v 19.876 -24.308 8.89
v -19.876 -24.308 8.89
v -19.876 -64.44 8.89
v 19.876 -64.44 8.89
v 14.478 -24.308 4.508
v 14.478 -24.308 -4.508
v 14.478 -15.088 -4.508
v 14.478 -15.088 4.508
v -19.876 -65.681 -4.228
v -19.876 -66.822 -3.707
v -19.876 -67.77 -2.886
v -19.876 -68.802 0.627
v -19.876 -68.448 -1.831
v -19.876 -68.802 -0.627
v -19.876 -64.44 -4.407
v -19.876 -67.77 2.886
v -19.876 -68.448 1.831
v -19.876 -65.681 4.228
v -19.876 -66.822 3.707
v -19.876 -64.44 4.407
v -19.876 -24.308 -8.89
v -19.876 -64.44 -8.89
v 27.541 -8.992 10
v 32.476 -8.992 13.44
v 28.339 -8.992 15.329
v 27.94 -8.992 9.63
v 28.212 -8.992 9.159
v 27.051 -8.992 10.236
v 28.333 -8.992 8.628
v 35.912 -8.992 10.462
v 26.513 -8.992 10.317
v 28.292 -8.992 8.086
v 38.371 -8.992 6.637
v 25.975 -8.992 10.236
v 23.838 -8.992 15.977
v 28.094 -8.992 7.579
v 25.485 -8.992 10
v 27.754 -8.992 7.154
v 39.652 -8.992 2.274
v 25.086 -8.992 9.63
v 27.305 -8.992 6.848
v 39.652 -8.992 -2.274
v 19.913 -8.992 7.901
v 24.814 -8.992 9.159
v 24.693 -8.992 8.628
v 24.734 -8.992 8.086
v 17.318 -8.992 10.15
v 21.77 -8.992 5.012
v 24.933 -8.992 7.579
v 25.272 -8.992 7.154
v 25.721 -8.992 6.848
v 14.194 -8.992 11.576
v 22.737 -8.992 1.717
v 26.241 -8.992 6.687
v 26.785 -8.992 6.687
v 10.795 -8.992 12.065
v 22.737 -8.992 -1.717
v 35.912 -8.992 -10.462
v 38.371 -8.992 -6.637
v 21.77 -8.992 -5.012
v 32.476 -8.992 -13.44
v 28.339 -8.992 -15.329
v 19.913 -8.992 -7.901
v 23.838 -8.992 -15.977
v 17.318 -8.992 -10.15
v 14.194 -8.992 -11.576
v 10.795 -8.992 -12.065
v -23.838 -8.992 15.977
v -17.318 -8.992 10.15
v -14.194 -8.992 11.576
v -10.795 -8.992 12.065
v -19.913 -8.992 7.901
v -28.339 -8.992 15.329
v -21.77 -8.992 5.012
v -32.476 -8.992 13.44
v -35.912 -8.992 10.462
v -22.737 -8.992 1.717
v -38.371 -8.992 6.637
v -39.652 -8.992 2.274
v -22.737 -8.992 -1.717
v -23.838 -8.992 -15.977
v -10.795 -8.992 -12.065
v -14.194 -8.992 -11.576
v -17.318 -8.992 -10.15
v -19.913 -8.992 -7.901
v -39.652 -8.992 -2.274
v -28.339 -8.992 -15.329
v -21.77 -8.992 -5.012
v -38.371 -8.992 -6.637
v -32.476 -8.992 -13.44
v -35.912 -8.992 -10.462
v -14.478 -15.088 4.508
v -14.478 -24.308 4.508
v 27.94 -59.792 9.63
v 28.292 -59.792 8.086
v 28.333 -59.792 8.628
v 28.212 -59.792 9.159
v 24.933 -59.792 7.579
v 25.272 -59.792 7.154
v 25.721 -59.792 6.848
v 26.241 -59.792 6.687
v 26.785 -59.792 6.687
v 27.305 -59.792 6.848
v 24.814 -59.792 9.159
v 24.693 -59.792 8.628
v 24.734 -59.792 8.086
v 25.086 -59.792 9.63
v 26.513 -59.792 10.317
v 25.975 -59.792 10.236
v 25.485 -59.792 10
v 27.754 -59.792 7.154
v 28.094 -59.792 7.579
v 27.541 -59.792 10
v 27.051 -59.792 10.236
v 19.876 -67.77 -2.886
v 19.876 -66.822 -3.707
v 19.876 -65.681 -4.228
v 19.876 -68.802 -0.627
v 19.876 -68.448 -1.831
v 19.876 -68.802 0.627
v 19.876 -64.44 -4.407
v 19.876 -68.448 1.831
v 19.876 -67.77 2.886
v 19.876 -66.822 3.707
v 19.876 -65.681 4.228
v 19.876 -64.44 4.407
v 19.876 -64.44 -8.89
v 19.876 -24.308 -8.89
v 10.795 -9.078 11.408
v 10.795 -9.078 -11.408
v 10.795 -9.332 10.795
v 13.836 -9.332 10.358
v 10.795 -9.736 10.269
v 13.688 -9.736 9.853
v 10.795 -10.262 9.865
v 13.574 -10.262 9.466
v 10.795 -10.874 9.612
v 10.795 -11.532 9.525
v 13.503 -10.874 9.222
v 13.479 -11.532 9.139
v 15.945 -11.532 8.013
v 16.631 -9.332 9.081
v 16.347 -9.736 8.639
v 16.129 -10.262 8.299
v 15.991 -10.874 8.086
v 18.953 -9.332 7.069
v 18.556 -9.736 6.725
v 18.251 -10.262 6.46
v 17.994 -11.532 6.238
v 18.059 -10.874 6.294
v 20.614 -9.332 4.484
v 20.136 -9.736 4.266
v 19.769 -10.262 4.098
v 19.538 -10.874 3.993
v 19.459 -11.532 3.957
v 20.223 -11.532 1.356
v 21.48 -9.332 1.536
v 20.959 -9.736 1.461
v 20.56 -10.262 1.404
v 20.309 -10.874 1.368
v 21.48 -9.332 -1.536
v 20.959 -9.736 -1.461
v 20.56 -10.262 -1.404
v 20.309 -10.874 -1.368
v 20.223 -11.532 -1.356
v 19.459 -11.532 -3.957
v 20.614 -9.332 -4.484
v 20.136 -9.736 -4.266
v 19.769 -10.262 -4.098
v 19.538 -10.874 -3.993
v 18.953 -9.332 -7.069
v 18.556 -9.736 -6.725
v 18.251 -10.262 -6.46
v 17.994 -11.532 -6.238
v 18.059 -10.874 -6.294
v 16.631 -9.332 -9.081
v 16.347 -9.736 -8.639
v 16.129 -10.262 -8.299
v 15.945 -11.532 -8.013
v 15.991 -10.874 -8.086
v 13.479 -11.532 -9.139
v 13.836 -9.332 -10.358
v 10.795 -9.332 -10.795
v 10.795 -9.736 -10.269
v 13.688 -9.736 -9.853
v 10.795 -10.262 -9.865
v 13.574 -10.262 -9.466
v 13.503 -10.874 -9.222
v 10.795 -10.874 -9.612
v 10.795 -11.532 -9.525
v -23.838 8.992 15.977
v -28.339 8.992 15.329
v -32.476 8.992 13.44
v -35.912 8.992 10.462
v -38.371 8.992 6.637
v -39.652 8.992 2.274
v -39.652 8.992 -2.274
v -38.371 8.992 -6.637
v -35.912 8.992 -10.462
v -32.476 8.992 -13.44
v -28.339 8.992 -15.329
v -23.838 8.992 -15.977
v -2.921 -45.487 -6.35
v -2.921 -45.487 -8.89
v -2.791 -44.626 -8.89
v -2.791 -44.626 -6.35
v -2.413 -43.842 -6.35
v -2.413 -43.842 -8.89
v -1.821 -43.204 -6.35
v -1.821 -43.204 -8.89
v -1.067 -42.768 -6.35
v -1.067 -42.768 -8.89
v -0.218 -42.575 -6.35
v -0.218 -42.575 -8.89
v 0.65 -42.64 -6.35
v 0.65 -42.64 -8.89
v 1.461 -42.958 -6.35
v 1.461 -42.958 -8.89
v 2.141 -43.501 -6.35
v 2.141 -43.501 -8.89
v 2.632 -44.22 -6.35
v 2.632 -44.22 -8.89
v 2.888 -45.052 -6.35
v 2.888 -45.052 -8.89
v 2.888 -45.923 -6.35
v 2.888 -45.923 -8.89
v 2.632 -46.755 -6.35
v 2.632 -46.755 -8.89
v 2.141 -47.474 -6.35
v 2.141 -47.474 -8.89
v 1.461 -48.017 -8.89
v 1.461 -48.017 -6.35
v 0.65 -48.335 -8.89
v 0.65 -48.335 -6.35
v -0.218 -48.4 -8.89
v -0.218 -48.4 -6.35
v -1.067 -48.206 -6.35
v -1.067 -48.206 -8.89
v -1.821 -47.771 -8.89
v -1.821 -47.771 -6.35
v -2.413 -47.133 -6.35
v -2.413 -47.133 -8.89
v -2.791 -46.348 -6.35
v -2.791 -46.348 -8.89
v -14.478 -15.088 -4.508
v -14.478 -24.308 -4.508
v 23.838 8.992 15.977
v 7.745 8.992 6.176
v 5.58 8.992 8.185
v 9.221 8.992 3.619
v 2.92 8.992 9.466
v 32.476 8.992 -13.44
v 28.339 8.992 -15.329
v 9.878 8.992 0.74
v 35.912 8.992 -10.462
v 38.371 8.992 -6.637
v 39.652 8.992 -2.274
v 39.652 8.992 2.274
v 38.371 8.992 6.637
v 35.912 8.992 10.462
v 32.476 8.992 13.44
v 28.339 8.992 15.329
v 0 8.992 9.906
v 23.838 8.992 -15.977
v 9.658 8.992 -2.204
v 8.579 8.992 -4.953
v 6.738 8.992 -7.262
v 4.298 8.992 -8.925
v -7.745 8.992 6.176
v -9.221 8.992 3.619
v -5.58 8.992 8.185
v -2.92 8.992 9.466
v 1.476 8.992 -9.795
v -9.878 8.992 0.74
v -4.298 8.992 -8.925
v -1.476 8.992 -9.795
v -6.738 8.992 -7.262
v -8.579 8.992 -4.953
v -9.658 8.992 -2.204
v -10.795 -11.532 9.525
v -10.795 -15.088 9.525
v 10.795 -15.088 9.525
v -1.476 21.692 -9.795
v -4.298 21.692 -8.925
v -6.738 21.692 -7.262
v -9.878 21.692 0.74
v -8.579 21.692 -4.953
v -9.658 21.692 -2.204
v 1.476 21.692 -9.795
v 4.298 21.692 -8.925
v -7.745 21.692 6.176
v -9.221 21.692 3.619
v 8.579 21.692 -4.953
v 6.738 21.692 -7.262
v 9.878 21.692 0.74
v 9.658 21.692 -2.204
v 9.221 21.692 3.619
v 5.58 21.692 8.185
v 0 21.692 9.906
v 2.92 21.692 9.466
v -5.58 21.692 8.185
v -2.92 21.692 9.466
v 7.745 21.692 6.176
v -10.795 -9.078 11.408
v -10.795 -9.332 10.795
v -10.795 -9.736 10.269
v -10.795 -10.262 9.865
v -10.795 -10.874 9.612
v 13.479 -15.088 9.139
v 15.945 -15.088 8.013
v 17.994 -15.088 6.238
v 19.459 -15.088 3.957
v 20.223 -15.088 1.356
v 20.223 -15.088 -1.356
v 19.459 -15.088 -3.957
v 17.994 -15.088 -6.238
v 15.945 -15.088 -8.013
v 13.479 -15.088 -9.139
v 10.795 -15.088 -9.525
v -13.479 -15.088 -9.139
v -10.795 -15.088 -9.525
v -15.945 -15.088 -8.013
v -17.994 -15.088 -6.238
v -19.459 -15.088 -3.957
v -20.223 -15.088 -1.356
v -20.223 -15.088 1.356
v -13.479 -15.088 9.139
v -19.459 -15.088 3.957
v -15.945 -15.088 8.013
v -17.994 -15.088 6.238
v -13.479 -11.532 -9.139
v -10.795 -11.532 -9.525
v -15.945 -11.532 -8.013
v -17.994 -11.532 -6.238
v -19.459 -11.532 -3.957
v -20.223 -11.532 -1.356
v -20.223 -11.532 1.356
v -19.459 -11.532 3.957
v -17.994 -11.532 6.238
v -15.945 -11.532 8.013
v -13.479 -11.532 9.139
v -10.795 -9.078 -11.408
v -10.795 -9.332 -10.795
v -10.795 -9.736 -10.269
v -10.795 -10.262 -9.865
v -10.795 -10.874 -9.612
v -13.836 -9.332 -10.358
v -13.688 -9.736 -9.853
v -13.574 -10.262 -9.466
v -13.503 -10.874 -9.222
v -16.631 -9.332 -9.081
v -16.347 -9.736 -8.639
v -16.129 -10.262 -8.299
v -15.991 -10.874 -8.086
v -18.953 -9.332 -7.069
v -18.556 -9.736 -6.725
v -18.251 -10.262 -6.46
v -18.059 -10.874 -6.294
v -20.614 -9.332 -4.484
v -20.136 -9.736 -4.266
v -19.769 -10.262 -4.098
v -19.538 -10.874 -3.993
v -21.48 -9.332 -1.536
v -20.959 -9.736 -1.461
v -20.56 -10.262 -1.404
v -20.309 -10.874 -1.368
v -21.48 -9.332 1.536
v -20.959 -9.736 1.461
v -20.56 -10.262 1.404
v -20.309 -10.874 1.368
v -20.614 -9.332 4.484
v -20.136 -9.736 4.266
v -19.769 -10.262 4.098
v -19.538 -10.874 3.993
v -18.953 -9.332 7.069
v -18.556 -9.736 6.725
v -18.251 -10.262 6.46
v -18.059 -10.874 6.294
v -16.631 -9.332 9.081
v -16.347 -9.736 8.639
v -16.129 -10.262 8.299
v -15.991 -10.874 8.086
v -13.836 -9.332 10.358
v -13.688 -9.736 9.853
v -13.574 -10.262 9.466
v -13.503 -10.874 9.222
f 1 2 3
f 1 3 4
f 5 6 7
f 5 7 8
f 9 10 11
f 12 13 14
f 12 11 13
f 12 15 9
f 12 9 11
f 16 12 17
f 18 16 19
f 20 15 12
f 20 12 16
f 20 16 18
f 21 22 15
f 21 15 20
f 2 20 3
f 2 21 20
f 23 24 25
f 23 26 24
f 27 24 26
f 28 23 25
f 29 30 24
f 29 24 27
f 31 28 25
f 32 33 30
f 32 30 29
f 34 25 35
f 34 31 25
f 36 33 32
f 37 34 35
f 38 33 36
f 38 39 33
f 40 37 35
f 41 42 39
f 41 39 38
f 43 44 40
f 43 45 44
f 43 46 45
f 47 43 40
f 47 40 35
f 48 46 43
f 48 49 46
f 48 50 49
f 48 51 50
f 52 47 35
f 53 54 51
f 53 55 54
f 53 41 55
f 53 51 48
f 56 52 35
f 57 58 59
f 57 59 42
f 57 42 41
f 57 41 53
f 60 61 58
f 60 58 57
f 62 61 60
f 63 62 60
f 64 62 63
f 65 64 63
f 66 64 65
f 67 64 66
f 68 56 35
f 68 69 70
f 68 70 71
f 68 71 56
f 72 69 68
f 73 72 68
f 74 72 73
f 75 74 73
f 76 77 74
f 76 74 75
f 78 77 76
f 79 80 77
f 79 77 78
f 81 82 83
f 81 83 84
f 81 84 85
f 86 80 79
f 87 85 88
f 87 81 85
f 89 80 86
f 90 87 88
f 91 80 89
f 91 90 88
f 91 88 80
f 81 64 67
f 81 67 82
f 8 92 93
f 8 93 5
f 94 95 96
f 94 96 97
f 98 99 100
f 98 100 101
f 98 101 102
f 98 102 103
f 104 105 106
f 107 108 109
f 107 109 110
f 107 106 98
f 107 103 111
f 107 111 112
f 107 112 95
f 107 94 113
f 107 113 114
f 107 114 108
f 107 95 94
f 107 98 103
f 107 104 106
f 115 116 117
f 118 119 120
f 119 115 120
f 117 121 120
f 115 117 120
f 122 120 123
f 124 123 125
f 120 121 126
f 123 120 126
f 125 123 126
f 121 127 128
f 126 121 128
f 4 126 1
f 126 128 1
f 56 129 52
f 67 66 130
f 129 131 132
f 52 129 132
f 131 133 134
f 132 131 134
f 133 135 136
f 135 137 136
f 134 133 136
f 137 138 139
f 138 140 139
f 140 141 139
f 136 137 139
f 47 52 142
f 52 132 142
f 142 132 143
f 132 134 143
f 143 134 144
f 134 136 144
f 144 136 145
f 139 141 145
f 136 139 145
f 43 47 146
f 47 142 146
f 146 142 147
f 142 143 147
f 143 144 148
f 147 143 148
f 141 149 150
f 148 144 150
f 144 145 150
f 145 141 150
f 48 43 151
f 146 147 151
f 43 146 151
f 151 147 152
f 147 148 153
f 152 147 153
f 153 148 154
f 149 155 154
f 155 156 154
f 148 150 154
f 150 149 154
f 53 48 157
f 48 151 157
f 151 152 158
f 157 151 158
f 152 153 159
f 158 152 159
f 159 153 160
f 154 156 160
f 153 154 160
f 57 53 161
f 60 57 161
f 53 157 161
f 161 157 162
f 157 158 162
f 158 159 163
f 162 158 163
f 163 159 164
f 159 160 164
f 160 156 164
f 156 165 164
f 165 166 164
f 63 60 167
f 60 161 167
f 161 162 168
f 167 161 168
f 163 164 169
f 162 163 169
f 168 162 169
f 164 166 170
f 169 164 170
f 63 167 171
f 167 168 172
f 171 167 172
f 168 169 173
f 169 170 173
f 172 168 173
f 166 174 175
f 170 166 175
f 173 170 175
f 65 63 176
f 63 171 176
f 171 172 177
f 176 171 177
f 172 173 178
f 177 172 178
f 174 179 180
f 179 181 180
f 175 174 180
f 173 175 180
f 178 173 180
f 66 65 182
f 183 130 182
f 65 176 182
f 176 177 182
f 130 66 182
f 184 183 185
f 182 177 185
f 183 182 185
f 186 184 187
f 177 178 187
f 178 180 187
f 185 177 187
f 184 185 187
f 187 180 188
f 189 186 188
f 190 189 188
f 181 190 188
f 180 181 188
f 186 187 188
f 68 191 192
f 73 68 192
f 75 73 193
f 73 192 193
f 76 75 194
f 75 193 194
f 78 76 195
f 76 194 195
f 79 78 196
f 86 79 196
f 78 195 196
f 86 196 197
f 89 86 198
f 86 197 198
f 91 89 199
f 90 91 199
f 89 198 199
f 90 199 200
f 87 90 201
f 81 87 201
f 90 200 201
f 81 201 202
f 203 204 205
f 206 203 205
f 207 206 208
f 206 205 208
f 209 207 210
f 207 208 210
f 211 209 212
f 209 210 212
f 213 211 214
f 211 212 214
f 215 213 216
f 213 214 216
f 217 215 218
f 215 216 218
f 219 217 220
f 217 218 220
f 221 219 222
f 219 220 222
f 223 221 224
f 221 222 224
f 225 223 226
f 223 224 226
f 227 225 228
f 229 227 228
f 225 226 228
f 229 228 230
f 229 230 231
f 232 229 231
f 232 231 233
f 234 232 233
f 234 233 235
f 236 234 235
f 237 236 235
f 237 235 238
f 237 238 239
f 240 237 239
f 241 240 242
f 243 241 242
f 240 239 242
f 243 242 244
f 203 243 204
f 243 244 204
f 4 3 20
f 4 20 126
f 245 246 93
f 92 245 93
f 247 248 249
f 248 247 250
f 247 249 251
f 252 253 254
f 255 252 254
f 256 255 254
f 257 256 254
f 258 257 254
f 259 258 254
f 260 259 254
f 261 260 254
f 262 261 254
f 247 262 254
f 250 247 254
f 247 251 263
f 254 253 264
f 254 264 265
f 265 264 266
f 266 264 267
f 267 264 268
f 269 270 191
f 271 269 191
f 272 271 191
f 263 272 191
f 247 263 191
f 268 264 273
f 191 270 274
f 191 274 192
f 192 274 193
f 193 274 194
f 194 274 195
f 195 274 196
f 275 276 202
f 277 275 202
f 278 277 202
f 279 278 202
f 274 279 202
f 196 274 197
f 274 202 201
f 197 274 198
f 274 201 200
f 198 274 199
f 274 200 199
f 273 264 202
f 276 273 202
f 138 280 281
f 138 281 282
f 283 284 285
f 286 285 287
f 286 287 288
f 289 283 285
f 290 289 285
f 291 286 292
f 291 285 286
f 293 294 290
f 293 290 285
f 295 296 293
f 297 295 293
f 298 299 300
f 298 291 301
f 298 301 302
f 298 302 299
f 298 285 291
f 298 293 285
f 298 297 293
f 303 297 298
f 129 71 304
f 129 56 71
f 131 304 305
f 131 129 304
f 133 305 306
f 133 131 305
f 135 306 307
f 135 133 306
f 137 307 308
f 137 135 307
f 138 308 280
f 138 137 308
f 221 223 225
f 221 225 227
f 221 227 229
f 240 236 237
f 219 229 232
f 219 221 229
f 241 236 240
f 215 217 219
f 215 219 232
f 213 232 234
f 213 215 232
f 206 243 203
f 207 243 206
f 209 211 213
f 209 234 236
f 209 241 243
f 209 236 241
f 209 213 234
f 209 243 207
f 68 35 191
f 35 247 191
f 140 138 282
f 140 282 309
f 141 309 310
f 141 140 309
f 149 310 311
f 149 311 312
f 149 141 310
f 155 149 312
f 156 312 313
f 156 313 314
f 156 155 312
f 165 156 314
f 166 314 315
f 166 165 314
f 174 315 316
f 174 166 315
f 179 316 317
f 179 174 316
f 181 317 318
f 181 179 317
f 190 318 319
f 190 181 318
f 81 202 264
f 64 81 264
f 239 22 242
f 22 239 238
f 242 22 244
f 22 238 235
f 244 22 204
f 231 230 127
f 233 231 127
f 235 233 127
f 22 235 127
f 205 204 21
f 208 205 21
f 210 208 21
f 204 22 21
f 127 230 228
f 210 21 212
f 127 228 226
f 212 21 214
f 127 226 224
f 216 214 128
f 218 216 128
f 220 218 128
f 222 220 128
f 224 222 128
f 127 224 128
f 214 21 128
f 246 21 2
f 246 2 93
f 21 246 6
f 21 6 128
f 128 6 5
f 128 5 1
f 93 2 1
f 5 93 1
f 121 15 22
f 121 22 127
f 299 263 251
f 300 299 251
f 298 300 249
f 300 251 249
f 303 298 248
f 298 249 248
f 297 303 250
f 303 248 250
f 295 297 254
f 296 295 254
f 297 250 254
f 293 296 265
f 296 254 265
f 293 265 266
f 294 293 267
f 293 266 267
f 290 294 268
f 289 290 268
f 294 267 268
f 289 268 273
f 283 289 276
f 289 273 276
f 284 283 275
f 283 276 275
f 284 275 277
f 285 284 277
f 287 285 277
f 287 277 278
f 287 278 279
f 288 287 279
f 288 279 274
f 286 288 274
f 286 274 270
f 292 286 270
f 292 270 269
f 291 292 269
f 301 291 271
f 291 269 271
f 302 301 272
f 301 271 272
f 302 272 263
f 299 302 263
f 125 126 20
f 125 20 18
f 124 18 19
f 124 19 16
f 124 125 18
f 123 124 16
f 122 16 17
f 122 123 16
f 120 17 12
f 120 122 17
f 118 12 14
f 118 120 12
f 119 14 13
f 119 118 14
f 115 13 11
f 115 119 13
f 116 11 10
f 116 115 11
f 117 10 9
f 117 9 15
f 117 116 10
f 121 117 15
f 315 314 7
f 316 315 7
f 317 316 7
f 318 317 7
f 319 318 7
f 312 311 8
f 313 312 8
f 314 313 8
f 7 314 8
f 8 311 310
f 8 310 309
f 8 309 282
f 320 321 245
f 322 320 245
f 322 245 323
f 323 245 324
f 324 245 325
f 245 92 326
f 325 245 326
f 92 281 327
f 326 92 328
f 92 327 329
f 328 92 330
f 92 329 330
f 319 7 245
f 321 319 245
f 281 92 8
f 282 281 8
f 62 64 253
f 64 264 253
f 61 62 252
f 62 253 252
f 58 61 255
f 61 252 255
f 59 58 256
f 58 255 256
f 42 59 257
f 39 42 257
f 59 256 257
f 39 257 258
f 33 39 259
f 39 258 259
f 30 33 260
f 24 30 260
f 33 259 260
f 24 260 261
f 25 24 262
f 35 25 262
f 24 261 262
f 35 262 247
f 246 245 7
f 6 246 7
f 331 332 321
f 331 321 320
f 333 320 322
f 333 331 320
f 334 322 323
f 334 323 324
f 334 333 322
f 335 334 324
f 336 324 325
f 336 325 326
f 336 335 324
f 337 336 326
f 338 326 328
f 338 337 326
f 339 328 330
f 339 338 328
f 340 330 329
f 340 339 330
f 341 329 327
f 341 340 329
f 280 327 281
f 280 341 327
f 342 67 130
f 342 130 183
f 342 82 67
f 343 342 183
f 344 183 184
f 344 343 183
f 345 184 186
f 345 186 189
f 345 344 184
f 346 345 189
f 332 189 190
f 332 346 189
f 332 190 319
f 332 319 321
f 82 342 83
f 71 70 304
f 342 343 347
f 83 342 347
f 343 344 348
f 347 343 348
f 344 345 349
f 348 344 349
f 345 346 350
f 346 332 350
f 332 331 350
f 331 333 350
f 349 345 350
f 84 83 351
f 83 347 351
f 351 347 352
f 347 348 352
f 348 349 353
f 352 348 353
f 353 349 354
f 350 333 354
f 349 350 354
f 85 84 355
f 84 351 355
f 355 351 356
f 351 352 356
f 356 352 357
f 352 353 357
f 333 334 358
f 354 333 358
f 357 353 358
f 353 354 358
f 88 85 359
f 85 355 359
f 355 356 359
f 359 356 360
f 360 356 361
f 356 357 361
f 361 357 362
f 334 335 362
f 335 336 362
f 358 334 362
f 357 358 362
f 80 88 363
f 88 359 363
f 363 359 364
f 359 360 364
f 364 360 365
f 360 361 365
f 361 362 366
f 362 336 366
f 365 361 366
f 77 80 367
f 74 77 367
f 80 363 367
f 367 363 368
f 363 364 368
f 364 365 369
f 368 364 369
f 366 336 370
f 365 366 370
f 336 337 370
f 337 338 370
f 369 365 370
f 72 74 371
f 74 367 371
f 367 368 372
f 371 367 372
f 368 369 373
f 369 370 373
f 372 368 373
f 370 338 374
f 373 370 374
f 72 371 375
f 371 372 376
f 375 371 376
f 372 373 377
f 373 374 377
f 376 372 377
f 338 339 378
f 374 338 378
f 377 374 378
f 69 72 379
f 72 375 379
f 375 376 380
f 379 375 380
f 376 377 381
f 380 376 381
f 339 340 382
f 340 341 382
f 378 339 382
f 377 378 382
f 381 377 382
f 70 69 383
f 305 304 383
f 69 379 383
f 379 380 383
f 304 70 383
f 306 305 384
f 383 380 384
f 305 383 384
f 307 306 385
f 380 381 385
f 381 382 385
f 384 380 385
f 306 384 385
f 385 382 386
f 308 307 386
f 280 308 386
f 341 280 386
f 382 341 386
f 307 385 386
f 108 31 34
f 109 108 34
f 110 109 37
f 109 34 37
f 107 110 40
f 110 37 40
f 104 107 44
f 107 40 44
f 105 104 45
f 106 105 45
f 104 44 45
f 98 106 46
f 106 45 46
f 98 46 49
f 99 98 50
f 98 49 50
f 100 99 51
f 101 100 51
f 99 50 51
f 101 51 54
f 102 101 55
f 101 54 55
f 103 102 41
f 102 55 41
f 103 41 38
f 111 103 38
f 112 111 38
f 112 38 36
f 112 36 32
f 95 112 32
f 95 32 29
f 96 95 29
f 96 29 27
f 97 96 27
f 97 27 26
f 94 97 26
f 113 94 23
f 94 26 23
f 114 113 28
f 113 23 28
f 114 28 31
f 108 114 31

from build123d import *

# Parameters (mm, degrees)
BOSS_EXTRU_1_DEPTH      = 8.9916
ESQUISSE2_R             = 9.906
BOSS_EXTRU_2_DEPTH      = 12.7
BOSS_EXTRU_3_DEPTH      = 6.096
CONG_1_R                = 2.54
ESQUISSE4_W             = 28.956
ESQUISSE4_H             = 9.017
BOSS_EXTRU_4_DEPTH      = 9.2202
ESQUISSE5_W             = 39.751
ESQUISSE5_H             = 17.78
BOSS_EXTRU_5_DEPTH      = 40.132
ESQUISSE6_R             = 4.4069
BOSS_EXTRU_6_DEPTH      = 39.751
ESQUISSE7_R             = 2.921
ENL_V_MAT_EXTRU_1_DEPTH = 2.54
ESQUISSE8_R             = 1.825
BOSS_EXTRU_7_DEPTH      = 50.8


with BuildPart() as part:
    # Esquisse1 → Boss.-Extru.1 (new, symmetric)
    with BuildSketch(Plane(origin=(0, 0, 0), x_dir=(1, 0, 0), z_dir=(0, 1, 0))):
        with BuildLine():
            Line((-23.8379, 15.9766), (23.8379, 15.9766))
            ThreePointArc((23.8379, 15.9766), (39.8145, 0), (23.8379, -15.9766))
            Line((23.8379, -15.9766), (-23.8379, -15.9766))
            ThreePointArc((-23.8379, -15.9766), (-39.8145, 0), (-23.8379, 15.9766))
        make_face()
    extrude(amount=BOSS_EXTRU_1_DEPTH, both=True)

    # Esquisse2 → Boss.-Extru.2 (add)
    with BuildSketch(Plane(origin=(0, 8.9916, 0), x_dir=(1, 0, 0), z_dir=(0, 1, 0))):
        with Locations(Location((0, 0, 0), (0, 0, 270))):
            Circle(ESQUISSE2_R)
    extrude(amount=BOSS_EXTRU_2_DEPTH)

    # Esquisse3 → Boss.-Extru.3 (add)
    with BuildSketch(Plane.XZ.offset(8.9916)):
        with BuildLine():
            Line((-10.795, 9.525), (10.795, 9.525))
            ThreePointArc((10.795, 9.525), (20.32, 0), (10.795, -9.525))
            Line((10.795, -9.525), (-10.795, -9.525))
            ThreePointArc((-10.795, -9.525), (-20.32, 0), (-10.795, 9.525))
        make_face()
    extrude(amount=BOSS_EXTRU_3_DEPTH)

    # Congé1
    cong_1_edges = [part.edges().sort_by_distance(p)[0] for p in [
        (-20.32, -8.9916, 0),
        (0, -8.9916, -9.525),
        (20.32, -8.9916, 0),
        (0, -8.9916, 9.525),
    ]]
    fillet(cong_1_edges, radius=CONG_1_R)

    # Esquisse4 → Boss.-Extru.4 (add)
    with BuildSketch(Plane.XZ.offset(15.0876)):
        Rectangle(ESQUISSE4_W, ESQUISSE4_H)
    extrude(amount=BOSS_EXTRU_4_DEPTH)

    # Esquisse5 → Boss.-Extru.5 (add)
    with BuildSketch(Plane.XZ.offset(24.3078)):
        Rectangle(ESQUISSE5_W, ESQUISSE5_H)
    extrude(amount=BOSS_EXTRU_5_DEPTH)

    # Esquisse6 → Boss.-Extru.6 (add)
    with BuildSketch(Plane(origin=(19.8755, 0, 0), x_dir=(0, 0, -1), z_dir=(1, 0, 0))):
        with Locations((0, -64.4398)):
            Circle(ESQUISSE6_R)
    extrude(amount=-BOSS_EXTRU_6_DEPTH)

    # Esquisse7 → Enlèv. mat.-Extru.1 (cut)
    with BuildSketch(Plane(origin=(0, 0, -8.89), x_dir=(-1, 0, 0), z_dir=(0, 0, -1))):
        with Locations((0, -45.487412675)):
            Circle(ESQUISSE7_R)
    extrude(amount=-ENL_V_MAT_EXTRU_1_DEPTH, mode=Mode.SUBTRACT)

    # Esquisse8 → Boss.-Extru.7 (add)
    with BuildSketch(Plane.XZ.offset(8.9916)):
        with Locations(Location((26.513063704, 8.491811342, 0), (0, 0, 90))):
            Circle(ESQUISSE8_R)
    extrude(amount=BOSS_EXTRU_7_DEPTH)


solid = part.part
